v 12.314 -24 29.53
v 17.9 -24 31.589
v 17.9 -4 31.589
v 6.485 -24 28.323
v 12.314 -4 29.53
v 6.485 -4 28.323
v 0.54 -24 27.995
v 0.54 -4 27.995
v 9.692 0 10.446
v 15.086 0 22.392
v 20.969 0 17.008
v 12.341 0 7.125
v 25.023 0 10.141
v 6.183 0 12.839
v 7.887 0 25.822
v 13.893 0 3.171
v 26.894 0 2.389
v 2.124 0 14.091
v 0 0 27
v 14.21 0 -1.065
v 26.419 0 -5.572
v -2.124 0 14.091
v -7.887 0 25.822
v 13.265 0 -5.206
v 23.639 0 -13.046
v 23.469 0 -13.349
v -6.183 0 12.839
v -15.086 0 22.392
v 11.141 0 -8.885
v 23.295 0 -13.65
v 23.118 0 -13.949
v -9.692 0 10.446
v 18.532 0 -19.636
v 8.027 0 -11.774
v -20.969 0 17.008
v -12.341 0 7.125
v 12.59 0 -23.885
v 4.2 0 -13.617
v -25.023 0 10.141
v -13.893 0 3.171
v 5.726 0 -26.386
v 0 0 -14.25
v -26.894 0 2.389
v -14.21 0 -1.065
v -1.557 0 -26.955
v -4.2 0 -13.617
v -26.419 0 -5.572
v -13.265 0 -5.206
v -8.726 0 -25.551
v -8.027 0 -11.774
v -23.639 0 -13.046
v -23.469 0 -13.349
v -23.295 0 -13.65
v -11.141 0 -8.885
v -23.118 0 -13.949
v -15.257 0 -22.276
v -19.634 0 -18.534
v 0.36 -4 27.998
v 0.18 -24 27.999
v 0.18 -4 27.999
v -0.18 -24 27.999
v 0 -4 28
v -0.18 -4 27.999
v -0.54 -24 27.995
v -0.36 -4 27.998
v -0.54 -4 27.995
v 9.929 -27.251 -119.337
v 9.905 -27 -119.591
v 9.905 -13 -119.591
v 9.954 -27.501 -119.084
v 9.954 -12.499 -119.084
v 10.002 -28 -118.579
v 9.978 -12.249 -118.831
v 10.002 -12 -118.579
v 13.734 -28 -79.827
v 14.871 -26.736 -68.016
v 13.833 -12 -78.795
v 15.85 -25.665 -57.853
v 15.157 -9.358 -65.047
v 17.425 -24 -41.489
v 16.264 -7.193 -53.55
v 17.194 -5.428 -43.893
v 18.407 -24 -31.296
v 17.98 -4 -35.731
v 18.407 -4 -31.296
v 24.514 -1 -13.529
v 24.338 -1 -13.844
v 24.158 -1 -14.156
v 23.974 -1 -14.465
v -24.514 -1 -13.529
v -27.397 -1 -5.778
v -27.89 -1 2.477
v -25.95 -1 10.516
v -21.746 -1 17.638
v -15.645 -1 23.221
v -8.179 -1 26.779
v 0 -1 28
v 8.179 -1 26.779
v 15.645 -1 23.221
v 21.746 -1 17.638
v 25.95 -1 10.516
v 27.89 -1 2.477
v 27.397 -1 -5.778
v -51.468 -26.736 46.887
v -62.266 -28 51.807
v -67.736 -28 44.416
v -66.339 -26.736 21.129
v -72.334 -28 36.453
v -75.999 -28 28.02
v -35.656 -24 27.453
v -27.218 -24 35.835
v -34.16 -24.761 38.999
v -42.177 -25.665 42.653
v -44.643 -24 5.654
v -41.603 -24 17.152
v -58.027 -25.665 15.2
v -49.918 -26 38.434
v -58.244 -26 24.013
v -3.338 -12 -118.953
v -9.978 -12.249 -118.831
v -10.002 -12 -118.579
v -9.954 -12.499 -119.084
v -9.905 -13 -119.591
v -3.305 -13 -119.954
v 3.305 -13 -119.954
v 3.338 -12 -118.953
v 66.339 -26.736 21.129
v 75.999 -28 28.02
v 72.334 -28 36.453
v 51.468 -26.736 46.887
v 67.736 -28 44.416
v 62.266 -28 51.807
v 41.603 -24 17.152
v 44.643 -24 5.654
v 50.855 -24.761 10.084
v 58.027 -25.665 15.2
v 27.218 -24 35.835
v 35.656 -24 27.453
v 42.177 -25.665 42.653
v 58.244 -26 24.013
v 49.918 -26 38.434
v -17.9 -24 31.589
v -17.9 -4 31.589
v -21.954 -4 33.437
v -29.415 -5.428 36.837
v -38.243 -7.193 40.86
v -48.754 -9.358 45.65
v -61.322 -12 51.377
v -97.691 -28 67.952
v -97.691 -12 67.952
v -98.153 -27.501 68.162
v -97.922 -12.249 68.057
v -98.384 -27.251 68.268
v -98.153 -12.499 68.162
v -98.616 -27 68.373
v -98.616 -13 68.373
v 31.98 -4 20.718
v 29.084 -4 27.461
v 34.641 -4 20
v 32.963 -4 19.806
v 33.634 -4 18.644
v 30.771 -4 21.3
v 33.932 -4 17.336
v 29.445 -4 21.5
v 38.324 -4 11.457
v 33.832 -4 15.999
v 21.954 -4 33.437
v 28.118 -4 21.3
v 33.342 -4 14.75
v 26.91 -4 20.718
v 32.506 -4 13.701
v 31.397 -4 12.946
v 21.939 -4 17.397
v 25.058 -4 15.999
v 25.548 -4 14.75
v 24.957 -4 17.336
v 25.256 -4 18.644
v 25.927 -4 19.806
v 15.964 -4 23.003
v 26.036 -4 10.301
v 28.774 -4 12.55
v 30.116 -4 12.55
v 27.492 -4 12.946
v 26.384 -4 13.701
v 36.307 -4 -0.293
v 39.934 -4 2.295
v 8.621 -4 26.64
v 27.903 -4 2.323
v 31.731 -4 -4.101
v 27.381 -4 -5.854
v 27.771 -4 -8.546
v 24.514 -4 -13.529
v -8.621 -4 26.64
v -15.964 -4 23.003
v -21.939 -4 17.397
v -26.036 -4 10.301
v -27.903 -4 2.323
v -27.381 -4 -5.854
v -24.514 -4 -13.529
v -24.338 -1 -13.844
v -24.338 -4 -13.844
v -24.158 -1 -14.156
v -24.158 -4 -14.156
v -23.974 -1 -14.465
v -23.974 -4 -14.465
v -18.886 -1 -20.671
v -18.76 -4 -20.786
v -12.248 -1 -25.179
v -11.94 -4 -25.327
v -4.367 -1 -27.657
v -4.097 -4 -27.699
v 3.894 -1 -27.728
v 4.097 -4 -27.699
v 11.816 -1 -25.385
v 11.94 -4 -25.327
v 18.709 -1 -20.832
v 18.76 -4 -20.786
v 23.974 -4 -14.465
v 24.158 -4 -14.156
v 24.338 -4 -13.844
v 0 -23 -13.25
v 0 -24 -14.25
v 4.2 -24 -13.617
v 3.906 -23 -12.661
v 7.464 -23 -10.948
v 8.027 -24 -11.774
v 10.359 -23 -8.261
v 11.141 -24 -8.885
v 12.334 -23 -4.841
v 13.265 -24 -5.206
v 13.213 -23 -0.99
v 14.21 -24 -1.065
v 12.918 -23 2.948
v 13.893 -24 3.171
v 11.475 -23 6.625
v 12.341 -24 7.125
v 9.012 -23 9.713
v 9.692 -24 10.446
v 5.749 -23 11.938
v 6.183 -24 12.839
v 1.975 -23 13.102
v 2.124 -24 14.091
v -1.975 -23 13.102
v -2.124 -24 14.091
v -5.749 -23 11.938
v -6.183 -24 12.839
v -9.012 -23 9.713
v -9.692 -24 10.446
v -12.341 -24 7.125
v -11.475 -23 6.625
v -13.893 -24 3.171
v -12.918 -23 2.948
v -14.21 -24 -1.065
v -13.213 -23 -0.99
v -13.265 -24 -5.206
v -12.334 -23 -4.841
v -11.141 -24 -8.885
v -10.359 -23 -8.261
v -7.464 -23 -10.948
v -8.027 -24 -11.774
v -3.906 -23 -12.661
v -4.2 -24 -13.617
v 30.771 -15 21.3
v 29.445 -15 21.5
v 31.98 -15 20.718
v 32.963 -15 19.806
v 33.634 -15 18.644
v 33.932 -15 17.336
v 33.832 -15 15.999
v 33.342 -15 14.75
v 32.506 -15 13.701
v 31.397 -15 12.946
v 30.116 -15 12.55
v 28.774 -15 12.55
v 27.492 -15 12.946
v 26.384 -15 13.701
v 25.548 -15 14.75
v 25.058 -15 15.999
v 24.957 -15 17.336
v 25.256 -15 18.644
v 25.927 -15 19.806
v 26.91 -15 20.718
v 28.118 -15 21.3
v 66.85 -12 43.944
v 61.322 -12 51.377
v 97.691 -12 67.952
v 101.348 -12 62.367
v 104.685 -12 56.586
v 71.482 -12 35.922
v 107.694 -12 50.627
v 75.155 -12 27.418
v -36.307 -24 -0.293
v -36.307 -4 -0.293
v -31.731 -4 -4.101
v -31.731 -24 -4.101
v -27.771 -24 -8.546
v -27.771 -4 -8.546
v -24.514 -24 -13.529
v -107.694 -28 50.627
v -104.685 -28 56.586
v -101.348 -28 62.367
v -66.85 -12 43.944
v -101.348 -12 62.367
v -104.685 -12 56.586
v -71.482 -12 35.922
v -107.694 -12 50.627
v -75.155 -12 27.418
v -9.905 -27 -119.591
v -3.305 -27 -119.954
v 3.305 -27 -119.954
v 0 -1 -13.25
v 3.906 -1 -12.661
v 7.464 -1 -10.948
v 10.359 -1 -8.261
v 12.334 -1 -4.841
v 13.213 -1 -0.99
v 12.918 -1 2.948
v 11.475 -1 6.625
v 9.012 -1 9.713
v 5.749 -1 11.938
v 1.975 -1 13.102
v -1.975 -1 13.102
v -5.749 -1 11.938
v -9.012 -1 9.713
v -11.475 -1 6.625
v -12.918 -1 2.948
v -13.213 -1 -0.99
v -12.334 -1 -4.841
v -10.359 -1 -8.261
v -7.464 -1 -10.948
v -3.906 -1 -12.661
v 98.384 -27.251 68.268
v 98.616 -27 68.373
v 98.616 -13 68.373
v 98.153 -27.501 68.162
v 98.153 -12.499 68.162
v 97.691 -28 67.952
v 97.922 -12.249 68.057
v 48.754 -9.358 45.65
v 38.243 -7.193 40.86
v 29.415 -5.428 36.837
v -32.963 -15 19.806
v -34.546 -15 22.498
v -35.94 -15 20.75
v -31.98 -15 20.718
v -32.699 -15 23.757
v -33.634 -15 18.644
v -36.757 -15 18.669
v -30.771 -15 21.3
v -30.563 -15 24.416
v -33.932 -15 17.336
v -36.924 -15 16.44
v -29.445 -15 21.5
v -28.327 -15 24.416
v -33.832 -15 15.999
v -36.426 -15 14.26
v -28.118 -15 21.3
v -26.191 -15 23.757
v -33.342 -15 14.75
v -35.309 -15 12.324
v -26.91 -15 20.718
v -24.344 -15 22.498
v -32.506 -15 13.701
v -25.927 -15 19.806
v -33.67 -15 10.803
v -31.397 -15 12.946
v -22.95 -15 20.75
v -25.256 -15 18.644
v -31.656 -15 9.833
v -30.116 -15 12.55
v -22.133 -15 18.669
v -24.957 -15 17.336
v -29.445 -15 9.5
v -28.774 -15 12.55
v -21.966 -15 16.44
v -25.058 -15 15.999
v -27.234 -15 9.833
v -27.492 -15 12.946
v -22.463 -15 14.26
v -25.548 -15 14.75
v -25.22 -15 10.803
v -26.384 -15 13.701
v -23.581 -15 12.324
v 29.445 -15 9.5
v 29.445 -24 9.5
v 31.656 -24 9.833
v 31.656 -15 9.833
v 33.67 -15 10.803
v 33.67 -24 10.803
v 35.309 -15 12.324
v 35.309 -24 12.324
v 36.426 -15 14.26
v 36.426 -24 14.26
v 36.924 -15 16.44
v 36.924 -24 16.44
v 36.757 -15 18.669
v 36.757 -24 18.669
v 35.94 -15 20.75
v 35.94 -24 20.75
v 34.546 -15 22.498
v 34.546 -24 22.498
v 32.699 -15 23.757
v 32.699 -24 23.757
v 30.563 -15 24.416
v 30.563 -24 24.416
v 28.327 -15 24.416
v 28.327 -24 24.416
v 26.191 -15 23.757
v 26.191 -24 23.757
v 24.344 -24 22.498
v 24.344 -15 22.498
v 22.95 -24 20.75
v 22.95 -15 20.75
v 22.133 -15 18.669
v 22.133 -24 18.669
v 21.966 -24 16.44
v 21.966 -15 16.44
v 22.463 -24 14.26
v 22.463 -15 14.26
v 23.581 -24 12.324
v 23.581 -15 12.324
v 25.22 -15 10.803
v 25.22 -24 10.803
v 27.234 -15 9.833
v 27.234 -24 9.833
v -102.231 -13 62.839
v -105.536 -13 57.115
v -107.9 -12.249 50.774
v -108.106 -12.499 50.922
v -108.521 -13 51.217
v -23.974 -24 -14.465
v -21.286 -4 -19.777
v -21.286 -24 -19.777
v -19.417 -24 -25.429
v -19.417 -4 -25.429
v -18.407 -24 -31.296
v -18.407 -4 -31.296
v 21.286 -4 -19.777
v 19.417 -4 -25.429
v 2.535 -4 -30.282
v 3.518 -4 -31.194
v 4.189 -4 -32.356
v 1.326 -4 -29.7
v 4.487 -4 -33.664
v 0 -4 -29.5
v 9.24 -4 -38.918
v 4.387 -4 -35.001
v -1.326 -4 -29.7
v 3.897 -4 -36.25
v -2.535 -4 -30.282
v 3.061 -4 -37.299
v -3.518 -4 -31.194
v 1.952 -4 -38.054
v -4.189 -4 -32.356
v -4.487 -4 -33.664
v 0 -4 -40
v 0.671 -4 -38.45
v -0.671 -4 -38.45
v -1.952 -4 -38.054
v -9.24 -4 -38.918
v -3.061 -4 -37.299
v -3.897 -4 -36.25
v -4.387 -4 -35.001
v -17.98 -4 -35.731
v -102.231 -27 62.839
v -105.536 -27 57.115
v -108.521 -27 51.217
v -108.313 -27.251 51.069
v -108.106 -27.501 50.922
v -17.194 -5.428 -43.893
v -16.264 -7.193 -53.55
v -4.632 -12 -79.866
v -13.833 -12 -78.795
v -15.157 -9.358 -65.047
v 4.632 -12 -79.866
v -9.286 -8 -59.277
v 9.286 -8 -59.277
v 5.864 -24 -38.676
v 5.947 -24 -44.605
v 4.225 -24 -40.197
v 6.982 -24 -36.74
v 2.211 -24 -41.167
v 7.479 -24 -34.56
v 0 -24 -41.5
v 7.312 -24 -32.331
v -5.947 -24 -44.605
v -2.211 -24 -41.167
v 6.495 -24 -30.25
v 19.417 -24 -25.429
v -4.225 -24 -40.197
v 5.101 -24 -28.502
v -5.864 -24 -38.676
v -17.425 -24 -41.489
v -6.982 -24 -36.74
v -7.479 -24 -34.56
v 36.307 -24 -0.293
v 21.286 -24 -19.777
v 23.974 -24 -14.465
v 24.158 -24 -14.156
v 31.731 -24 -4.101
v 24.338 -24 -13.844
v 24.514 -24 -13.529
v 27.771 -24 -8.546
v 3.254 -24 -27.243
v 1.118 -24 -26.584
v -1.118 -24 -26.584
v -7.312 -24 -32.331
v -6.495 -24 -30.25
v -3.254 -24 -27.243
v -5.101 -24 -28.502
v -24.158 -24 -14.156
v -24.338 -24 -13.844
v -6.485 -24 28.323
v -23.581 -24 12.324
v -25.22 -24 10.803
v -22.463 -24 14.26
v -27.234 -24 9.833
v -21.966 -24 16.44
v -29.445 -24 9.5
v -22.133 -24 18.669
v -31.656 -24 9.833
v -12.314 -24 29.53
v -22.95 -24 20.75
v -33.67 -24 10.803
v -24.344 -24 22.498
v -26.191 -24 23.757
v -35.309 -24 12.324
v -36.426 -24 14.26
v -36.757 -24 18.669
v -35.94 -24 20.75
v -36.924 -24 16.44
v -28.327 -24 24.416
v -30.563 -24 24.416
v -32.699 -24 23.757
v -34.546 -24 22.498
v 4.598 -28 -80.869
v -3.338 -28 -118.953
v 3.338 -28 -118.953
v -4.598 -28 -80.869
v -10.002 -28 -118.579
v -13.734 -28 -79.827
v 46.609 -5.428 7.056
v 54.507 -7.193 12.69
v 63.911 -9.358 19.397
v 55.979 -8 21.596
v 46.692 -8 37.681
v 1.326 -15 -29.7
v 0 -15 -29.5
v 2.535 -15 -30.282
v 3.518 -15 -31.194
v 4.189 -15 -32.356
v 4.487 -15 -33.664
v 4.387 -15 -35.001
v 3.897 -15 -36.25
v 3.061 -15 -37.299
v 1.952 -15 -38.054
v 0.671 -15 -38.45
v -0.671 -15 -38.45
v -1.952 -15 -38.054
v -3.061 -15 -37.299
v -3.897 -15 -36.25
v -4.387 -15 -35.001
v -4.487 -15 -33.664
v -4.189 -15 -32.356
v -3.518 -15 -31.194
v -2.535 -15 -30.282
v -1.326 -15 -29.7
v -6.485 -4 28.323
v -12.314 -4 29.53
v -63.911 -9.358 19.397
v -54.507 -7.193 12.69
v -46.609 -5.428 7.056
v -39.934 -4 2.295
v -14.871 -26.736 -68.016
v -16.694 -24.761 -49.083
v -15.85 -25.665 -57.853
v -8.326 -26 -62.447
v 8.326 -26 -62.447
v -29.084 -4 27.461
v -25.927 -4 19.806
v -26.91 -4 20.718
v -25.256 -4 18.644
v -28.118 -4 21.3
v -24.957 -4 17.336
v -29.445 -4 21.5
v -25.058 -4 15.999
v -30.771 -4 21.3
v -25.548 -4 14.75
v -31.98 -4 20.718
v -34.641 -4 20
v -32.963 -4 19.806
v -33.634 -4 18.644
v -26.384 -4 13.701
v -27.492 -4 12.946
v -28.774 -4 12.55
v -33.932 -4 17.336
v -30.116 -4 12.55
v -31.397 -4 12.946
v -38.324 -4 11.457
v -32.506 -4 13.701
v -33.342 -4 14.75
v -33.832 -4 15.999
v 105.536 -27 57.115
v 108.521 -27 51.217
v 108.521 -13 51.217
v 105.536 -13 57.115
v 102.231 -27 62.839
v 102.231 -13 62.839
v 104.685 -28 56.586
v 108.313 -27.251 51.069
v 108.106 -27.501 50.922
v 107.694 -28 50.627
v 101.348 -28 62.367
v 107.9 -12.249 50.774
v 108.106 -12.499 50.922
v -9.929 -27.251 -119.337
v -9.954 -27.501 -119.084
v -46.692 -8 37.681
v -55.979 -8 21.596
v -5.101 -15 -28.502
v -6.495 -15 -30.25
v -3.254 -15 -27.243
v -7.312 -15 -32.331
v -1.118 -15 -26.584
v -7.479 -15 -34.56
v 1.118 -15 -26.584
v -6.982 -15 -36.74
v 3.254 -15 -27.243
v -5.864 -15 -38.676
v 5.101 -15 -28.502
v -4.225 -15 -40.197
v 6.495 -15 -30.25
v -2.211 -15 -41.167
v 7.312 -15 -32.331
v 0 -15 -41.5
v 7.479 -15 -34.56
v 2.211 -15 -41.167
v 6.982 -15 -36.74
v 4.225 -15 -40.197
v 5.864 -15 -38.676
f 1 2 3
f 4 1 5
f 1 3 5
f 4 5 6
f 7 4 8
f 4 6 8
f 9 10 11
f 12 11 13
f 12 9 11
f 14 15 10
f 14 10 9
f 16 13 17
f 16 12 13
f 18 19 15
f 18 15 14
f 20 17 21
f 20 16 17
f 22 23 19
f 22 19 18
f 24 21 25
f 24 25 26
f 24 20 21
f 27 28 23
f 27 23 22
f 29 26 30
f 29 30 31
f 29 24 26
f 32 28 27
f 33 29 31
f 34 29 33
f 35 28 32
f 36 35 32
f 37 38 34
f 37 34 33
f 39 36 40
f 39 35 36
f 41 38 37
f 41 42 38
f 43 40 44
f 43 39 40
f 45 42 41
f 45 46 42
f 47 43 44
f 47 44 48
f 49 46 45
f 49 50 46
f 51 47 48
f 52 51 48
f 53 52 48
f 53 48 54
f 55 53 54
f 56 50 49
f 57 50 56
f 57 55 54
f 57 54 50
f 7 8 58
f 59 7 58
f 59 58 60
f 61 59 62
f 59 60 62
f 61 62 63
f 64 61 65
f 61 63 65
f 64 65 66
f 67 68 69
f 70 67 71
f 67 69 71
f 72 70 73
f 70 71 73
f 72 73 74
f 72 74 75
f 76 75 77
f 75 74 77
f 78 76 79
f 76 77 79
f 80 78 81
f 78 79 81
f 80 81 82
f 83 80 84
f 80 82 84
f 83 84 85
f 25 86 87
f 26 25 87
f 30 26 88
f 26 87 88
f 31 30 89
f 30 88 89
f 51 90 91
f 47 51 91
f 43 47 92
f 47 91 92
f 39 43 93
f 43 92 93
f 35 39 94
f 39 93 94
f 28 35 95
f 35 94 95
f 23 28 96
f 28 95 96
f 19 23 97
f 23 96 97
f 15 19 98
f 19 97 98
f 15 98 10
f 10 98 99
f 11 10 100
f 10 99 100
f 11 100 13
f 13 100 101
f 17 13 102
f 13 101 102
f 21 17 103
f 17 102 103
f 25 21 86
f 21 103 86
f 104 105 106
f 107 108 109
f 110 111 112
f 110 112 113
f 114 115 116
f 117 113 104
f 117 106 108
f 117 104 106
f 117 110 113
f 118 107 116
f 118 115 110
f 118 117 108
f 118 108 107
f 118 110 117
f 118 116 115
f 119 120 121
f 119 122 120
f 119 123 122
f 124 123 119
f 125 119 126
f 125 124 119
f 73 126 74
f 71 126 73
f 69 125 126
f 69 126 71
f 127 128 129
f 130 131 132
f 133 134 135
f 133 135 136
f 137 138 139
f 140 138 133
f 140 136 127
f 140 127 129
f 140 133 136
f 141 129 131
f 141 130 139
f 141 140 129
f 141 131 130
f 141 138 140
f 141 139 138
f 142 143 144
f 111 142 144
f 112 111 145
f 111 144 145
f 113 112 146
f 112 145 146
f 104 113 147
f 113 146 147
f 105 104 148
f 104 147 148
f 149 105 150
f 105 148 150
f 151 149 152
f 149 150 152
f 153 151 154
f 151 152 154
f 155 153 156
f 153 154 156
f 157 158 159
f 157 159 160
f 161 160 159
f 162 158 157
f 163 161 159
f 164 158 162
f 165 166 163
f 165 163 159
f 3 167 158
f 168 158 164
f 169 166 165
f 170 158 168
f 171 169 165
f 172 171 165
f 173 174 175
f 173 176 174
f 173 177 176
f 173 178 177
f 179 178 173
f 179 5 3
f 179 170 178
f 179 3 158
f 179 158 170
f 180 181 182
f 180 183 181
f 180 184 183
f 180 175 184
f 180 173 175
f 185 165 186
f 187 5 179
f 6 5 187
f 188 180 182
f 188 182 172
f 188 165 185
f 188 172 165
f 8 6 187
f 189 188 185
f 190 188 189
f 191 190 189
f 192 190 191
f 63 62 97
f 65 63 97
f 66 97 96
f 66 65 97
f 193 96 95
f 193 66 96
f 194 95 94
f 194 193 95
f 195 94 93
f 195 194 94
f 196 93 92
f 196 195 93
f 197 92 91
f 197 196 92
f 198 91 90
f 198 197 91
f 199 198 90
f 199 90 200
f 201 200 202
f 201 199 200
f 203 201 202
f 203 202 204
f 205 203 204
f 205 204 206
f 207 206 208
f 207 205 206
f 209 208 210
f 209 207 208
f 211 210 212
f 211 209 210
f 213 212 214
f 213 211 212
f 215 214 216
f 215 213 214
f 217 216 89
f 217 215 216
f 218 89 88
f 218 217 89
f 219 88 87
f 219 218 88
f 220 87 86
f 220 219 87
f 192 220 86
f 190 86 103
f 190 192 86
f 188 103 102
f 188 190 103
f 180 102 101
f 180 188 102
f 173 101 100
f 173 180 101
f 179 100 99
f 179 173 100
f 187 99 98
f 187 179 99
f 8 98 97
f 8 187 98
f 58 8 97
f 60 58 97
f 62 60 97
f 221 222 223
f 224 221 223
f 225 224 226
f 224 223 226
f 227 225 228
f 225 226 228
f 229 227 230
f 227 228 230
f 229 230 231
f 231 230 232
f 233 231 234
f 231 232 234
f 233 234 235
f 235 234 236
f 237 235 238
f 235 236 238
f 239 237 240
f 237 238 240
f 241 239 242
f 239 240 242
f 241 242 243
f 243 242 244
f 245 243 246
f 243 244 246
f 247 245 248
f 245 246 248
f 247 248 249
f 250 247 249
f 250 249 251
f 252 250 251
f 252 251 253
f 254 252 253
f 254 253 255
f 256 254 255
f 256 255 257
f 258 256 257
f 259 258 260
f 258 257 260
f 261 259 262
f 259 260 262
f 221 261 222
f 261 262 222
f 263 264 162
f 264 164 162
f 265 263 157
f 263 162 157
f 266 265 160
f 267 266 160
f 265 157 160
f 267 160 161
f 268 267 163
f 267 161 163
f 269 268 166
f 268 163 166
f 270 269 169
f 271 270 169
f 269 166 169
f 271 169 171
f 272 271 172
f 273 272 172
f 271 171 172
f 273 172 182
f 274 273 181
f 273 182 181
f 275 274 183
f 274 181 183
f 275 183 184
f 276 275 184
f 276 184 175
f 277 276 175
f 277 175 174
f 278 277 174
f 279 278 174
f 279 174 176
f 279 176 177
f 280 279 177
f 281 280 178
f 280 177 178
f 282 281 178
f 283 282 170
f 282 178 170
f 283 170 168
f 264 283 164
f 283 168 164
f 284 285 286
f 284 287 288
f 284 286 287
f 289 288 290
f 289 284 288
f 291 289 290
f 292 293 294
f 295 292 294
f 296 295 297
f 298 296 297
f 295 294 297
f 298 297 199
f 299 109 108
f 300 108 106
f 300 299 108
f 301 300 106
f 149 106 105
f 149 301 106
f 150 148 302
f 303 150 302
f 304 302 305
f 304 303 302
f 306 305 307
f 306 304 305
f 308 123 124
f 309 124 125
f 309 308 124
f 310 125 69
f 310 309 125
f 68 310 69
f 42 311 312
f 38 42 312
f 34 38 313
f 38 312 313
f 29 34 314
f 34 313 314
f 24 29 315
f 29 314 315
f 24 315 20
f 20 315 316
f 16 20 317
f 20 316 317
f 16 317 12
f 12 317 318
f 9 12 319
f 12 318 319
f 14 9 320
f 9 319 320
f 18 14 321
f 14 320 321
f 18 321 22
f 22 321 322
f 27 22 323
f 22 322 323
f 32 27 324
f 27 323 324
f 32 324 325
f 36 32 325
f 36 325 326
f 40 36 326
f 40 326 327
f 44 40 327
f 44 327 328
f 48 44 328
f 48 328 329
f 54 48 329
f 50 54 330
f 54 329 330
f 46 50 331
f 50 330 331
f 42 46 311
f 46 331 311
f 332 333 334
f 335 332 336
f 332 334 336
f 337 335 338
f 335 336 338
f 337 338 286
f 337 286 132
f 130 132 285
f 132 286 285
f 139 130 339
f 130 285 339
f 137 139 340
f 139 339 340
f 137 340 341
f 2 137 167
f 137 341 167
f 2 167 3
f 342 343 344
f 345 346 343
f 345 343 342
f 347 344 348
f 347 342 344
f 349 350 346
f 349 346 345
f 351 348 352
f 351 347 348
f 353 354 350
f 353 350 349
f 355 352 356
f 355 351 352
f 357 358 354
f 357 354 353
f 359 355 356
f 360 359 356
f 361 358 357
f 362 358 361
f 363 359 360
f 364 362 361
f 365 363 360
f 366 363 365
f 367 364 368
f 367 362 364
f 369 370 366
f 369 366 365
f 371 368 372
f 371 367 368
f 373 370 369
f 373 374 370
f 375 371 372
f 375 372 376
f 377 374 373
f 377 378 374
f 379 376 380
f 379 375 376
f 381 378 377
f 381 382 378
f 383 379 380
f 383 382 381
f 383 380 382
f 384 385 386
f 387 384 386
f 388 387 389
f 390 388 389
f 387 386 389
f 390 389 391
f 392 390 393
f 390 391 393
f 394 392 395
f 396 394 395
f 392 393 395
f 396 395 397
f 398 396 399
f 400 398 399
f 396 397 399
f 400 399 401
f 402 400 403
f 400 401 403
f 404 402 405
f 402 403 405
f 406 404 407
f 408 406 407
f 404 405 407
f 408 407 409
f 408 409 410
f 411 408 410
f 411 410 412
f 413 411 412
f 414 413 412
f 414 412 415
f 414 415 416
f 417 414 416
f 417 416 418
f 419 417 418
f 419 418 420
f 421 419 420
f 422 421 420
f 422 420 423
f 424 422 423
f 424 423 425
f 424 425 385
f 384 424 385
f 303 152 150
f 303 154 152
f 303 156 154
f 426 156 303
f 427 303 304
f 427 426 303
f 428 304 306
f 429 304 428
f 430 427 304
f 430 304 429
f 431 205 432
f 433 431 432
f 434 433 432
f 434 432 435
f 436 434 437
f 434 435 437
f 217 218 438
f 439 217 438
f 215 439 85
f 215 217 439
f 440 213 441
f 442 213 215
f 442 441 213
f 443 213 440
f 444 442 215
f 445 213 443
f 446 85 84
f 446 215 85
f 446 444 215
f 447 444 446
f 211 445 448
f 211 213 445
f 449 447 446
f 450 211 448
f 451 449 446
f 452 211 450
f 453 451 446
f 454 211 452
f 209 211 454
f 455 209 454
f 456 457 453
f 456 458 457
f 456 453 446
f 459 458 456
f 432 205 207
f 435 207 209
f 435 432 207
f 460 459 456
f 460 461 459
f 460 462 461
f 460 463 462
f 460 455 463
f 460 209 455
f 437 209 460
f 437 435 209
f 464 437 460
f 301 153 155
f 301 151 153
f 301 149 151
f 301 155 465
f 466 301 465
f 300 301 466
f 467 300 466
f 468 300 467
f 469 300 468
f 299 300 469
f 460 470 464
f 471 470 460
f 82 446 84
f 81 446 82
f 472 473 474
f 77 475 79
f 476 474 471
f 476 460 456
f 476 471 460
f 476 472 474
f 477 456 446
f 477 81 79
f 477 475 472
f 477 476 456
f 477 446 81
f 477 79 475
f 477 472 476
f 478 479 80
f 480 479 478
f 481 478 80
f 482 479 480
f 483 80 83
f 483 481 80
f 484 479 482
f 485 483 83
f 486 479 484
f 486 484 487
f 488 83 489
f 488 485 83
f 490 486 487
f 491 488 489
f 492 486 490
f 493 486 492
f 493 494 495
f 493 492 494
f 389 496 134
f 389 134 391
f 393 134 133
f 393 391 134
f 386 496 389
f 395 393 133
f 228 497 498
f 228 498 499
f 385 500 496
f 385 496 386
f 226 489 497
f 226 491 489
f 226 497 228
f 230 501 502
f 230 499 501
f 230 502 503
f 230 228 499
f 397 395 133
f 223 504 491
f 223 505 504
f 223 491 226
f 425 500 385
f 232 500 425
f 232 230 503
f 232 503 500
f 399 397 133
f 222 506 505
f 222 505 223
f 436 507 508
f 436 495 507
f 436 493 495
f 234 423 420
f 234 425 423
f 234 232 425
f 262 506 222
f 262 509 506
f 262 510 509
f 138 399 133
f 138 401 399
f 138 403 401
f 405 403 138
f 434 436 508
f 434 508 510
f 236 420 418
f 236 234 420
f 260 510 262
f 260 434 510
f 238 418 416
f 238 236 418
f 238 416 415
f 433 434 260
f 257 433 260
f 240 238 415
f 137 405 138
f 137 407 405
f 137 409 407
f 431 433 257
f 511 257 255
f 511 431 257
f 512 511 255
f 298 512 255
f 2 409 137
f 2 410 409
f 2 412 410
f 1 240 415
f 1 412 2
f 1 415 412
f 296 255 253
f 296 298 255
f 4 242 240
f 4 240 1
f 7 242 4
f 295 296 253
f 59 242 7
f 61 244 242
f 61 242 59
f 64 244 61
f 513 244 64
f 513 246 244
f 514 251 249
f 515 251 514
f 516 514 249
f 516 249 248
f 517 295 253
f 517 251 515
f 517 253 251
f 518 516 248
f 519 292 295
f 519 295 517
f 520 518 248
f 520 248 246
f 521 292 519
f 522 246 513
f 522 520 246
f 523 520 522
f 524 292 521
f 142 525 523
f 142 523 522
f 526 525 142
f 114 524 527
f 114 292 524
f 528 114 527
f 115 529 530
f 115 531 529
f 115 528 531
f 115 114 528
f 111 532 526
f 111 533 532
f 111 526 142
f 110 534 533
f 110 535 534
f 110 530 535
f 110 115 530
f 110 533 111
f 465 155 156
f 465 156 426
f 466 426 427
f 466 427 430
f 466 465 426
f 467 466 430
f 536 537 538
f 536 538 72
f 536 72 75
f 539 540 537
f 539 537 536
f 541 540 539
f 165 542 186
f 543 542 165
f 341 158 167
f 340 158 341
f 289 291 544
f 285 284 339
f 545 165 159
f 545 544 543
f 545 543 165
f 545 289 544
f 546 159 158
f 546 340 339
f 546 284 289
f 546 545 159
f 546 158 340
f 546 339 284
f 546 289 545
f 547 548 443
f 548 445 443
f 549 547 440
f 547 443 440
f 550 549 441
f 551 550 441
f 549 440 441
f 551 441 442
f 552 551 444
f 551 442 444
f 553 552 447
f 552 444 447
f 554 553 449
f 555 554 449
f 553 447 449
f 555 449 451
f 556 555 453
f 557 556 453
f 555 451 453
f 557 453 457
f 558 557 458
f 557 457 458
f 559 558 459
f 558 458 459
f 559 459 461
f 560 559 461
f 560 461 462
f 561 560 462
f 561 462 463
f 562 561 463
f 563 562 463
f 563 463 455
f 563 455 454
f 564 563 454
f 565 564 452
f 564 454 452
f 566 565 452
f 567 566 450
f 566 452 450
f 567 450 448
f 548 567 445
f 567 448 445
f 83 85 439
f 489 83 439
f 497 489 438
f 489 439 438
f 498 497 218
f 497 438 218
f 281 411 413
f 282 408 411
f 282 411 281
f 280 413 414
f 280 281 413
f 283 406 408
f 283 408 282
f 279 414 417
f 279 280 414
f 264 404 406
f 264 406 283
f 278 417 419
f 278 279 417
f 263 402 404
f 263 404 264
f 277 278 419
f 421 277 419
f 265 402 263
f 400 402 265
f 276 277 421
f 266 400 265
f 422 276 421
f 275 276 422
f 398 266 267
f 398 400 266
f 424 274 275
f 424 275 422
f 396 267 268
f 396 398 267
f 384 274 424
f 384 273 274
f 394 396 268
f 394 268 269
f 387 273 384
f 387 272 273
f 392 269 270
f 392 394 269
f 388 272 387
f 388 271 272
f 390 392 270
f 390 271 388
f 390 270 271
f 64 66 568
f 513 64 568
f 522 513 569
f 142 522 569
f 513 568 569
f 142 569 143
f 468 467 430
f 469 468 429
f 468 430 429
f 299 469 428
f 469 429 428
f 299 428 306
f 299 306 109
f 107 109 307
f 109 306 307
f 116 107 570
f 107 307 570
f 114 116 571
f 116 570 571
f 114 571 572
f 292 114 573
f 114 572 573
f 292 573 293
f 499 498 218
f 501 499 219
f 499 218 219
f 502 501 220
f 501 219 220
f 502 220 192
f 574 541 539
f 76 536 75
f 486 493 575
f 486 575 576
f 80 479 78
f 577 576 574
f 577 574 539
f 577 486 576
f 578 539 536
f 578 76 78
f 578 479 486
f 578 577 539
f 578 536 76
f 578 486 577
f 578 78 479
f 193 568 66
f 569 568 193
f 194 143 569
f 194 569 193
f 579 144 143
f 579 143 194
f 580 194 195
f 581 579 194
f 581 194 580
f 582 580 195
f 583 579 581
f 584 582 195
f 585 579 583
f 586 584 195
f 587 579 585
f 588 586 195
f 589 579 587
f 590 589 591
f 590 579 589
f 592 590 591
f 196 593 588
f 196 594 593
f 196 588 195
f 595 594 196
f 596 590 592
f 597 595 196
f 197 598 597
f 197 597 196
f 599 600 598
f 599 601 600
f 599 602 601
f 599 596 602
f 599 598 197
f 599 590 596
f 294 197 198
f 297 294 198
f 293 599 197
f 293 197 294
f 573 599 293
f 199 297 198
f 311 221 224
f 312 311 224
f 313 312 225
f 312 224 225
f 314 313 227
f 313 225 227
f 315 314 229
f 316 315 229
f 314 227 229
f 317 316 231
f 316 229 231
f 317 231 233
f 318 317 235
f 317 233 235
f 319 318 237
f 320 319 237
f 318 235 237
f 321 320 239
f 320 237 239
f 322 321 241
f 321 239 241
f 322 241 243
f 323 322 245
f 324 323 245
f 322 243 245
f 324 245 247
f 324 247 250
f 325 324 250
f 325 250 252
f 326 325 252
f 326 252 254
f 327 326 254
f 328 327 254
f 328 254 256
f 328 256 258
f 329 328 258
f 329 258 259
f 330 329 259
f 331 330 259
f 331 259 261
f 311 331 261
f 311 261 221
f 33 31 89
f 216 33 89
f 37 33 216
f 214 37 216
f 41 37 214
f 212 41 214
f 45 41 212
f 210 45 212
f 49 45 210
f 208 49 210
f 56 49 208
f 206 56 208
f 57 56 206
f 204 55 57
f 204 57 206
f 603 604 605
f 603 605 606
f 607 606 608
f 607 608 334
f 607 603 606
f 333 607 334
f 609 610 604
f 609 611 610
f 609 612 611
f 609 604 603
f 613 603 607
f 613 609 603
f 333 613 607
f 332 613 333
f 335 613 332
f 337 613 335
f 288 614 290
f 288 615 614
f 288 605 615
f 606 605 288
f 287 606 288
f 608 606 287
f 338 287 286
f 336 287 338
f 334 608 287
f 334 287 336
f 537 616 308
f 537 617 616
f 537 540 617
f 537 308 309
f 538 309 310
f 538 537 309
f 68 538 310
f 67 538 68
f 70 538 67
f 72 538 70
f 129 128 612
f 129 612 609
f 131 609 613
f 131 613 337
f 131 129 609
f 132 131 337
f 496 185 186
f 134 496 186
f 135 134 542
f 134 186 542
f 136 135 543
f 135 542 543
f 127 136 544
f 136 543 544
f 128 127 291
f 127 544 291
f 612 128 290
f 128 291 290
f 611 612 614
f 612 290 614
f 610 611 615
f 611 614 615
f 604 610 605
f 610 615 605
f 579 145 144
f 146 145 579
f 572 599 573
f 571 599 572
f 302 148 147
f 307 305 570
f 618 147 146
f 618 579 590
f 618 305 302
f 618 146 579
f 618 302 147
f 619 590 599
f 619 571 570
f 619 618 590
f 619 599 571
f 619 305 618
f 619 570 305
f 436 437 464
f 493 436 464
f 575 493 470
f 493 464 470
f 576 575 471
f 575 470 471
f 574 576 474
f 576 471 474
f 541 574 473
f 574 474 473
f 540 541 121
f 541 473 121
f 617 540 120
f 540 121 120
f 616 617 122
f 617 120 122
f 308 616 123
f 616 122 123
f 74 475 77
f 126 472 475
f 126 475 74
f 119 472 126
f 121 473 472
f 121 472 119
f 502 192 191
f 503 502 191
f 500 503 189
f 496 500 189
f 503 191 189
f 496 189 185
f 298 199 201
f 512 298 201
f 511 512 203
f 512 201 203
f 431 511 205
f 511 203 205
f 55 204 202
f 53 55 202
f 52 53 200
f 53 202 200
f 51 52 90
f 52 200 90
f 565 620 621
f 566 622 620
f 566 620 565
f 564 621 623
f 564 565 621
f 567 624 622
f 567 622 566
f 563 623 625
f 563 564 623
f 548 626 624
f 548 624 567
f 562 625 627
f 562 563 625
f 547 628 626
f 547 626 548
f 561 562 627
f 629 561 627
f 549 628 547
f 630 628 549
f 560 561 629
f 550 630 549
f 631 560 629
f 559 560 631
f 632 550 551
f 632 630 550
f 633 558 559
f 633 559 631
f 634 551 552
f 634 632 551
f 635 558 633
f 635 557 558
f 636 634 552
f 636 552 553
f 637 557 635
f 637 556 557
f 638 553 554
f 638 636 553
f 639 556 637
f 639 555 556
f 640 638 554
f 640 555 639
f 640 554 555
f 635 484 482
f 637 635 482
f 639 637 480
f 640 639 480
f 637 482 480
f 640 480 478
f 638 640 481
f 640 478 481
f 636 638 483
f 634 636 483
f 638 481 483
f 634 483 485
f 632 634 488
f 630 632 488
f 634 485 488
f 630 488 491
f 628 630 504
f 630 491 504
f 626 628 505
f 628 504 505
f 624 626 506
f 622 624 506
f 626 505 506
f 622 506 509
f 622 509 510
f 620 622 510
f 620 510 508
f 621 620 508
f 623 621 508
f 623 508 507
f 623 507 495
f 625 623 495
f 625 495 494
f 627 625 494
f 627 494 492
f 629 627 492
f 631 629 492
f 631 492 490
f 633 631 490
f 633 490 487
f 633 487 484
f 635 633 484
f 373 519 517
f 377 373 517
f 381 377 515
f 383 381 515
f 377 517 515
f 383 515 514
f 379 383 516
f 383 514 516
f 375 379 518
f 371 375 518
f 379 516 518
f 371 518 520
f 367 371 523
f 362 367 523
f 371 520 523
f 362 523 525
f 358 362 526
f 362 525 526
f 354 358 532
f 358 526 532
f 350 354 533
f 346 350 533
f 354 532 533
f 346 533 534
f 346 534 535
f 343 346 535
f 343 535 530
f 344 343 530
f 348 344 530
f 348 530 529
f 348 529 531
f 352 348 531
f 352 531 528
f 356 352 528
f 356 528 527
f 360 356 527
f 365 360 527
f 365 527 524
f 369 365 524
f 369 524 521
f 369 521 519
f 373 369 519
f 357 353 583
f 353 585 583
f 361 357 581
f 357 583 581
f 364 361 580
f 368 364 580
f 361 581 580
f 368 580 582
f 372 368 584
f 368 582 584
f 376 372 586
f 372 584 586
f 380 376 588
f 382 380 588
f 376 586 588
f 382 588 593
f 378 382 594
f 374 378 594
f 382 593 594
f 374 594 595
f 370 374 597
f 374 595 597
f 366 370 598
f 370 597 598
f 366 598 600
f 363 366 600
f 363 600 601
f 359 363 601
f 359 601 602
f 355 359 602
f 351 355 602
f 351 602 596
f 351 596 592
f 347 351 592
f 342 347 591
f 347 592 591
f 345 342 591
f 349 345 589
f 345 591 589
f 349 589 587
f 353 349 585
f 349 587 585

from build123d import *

# Parameters (mm, degrees)
SKETCH_4_OUTSIDE_W        = 310.112
SKETCH_4_OUTSIDE_H        = 310.112
CUT_EXTRUDE_1_DEPTH       = 28
HOLE_WIZARD_1_D           = 9
HOLE_WIZARD_1_CBORE_D     = 15
HOLE_WIZARD_1_CBORE_DEPTH = 9
HOLE_WIZARD_M30_2_D       = 26.5
CHAMFER_1_SIZE            = 1


with BuildPart() as part:
    # 草图3 → 旋转1 (revolve)
    with BuildSketch(Plane.XY, mode=Mode.PRIVATE) as revolve_1_sk:
        Polygon((0, 0), (-28, 0), (-28, -4), (-40, -4), (-80, -12), (-120, -12), (-120, -28), (-81, -28), (-45, -24), (0, -24), align=None)
    revolve(revolve_1_sk.sketch.rotate(Axis((0, 0, 0), (0, -1, 0)), 270), axis=Axis((0, 0, 0), (0, -1, 0)))

    # 草图4 outside → 切除-拉伸1 (cut)
    with BuildSketch(Plane(origin=(0, 0, 0), x_dir=(1, 0, 0), z_dir=(0, 1, 0))):
        Rectangle(SKETCH_4_OUTSIDE_W, SKETCH_4_OUTSIDE_H)
        with BuildLine():
            Line((-18.406763831, 31.296320472), (-9.905, 119.590513733))
            ThreePointArc((-9.905, 119.590513733), (0, 120), (9.905, 119.590513733))
            Line((9.905, 119.590513733), (18.406763831, 31.296320472))
            ThreePointArc((18.406763831, 31.296320472), (20.246227355, 22.568533354), (23.974016609, 14.465356118))
            ThreePointArc((23.974016609, 14.465356118), (24.248711306, 14), (24.514374178, 13.529429355))
            ThreePointArc((24.514374178, 13.529429355), (29.668036888, 6.249480544), (36.306790489, 0.292564843))
            Line((36.306790489, 0.292564843), (108.520922945, -51.217275242))
            ThreePointArc((108.520922945, -51.217275242), (103.923048454, -60), (98.615922945, -68.373238491))
            Line((98.615922945, -68.373238491), (17.900026658, -31.588885314))
            ThreePointArc((17.900026658, -31.588885314), (9.421809533, -28.818013897), (0.540357568, -27.994785473))
            ThreePointArc((0.540357568, -27.994785473), (0, -28), (-0.540357568, -27.994785473))
            ThreePointArc((-0.540357568, -27.994785473), (-9.421809533, -28.818013897), (-17.900026658, -31.588885314))
            Line((-17.900026658, -31.588885314), (-98.615922945, -68.373238491))
            ThreePointArc((-98.615922945, -68.373238491), (-103.923048454, -60), (-108.520922945, -51.217275242))
            Line((-108.520922945, -51.217275242), (-36.306790489, 0.292564843))
            ThreePointArc((-36.306790489, 0.292564843), (-29.668036888, 6.249480544), (-24.514374178, 13.529429355))
            ThreePointArc((-24.514374178, 13.529429355), (-24.248711306, 14), (-23.974016609, 14.465356118))
            ThreePointArc((-23.974016609, 14.465356118), (-20.246227355, 22.568533354), (-18.406763831, 31.296320472))
        make_face(mode=Mode.SUBTRACT)
    extrude(amount=-CUT_EXTRUDE_1_DEPTH, mode=Mode.SUBTRACT)

    # 打孔尺寸(%根据)内六角圆柱头螺钉的类型1 (through all)
    with Locations(Plane(origin=(0, -24, -34), x_dir=(0, 0, -1), z_dir=(0, -1, 0))):
        with Locations((0, 0), (-51, 29.444863729), (-51, -29.444863729)):
            CounterBoreHole(HOLE_WIZARD_1_D / 2, HOLE_WIZARD_1_CBORE_D / 2, HOLE_WIZARD_1_CBORE_DEPTH)

    # M30 螺纹孔2 (through all)
    with Locations(Plane.ZX):
        with Locations((0, 0)):
            Hole(HOLE_WIZARD_M30_2_D / 2)

    # 倒角1
    chamfer_1_edges = [part.edges().sort_by_distance(p)[0] for p in [
        (-0.270191364, 0, 27.998696338),
        (0, 0, 13.25),
        (0, -24, 13.25),
        (0, -28, -120),
        (-103.923048454, -28, 60),
        (0, -12, -120),
        (-103.923048454, -12, 60),
        (103.923048454, -28, 60),
        (103.923048454, -12, 60),
    ]]
    chamfer(chamfer_1_edges, length=CHAMFER_1_SIZE)


solid = part.part
